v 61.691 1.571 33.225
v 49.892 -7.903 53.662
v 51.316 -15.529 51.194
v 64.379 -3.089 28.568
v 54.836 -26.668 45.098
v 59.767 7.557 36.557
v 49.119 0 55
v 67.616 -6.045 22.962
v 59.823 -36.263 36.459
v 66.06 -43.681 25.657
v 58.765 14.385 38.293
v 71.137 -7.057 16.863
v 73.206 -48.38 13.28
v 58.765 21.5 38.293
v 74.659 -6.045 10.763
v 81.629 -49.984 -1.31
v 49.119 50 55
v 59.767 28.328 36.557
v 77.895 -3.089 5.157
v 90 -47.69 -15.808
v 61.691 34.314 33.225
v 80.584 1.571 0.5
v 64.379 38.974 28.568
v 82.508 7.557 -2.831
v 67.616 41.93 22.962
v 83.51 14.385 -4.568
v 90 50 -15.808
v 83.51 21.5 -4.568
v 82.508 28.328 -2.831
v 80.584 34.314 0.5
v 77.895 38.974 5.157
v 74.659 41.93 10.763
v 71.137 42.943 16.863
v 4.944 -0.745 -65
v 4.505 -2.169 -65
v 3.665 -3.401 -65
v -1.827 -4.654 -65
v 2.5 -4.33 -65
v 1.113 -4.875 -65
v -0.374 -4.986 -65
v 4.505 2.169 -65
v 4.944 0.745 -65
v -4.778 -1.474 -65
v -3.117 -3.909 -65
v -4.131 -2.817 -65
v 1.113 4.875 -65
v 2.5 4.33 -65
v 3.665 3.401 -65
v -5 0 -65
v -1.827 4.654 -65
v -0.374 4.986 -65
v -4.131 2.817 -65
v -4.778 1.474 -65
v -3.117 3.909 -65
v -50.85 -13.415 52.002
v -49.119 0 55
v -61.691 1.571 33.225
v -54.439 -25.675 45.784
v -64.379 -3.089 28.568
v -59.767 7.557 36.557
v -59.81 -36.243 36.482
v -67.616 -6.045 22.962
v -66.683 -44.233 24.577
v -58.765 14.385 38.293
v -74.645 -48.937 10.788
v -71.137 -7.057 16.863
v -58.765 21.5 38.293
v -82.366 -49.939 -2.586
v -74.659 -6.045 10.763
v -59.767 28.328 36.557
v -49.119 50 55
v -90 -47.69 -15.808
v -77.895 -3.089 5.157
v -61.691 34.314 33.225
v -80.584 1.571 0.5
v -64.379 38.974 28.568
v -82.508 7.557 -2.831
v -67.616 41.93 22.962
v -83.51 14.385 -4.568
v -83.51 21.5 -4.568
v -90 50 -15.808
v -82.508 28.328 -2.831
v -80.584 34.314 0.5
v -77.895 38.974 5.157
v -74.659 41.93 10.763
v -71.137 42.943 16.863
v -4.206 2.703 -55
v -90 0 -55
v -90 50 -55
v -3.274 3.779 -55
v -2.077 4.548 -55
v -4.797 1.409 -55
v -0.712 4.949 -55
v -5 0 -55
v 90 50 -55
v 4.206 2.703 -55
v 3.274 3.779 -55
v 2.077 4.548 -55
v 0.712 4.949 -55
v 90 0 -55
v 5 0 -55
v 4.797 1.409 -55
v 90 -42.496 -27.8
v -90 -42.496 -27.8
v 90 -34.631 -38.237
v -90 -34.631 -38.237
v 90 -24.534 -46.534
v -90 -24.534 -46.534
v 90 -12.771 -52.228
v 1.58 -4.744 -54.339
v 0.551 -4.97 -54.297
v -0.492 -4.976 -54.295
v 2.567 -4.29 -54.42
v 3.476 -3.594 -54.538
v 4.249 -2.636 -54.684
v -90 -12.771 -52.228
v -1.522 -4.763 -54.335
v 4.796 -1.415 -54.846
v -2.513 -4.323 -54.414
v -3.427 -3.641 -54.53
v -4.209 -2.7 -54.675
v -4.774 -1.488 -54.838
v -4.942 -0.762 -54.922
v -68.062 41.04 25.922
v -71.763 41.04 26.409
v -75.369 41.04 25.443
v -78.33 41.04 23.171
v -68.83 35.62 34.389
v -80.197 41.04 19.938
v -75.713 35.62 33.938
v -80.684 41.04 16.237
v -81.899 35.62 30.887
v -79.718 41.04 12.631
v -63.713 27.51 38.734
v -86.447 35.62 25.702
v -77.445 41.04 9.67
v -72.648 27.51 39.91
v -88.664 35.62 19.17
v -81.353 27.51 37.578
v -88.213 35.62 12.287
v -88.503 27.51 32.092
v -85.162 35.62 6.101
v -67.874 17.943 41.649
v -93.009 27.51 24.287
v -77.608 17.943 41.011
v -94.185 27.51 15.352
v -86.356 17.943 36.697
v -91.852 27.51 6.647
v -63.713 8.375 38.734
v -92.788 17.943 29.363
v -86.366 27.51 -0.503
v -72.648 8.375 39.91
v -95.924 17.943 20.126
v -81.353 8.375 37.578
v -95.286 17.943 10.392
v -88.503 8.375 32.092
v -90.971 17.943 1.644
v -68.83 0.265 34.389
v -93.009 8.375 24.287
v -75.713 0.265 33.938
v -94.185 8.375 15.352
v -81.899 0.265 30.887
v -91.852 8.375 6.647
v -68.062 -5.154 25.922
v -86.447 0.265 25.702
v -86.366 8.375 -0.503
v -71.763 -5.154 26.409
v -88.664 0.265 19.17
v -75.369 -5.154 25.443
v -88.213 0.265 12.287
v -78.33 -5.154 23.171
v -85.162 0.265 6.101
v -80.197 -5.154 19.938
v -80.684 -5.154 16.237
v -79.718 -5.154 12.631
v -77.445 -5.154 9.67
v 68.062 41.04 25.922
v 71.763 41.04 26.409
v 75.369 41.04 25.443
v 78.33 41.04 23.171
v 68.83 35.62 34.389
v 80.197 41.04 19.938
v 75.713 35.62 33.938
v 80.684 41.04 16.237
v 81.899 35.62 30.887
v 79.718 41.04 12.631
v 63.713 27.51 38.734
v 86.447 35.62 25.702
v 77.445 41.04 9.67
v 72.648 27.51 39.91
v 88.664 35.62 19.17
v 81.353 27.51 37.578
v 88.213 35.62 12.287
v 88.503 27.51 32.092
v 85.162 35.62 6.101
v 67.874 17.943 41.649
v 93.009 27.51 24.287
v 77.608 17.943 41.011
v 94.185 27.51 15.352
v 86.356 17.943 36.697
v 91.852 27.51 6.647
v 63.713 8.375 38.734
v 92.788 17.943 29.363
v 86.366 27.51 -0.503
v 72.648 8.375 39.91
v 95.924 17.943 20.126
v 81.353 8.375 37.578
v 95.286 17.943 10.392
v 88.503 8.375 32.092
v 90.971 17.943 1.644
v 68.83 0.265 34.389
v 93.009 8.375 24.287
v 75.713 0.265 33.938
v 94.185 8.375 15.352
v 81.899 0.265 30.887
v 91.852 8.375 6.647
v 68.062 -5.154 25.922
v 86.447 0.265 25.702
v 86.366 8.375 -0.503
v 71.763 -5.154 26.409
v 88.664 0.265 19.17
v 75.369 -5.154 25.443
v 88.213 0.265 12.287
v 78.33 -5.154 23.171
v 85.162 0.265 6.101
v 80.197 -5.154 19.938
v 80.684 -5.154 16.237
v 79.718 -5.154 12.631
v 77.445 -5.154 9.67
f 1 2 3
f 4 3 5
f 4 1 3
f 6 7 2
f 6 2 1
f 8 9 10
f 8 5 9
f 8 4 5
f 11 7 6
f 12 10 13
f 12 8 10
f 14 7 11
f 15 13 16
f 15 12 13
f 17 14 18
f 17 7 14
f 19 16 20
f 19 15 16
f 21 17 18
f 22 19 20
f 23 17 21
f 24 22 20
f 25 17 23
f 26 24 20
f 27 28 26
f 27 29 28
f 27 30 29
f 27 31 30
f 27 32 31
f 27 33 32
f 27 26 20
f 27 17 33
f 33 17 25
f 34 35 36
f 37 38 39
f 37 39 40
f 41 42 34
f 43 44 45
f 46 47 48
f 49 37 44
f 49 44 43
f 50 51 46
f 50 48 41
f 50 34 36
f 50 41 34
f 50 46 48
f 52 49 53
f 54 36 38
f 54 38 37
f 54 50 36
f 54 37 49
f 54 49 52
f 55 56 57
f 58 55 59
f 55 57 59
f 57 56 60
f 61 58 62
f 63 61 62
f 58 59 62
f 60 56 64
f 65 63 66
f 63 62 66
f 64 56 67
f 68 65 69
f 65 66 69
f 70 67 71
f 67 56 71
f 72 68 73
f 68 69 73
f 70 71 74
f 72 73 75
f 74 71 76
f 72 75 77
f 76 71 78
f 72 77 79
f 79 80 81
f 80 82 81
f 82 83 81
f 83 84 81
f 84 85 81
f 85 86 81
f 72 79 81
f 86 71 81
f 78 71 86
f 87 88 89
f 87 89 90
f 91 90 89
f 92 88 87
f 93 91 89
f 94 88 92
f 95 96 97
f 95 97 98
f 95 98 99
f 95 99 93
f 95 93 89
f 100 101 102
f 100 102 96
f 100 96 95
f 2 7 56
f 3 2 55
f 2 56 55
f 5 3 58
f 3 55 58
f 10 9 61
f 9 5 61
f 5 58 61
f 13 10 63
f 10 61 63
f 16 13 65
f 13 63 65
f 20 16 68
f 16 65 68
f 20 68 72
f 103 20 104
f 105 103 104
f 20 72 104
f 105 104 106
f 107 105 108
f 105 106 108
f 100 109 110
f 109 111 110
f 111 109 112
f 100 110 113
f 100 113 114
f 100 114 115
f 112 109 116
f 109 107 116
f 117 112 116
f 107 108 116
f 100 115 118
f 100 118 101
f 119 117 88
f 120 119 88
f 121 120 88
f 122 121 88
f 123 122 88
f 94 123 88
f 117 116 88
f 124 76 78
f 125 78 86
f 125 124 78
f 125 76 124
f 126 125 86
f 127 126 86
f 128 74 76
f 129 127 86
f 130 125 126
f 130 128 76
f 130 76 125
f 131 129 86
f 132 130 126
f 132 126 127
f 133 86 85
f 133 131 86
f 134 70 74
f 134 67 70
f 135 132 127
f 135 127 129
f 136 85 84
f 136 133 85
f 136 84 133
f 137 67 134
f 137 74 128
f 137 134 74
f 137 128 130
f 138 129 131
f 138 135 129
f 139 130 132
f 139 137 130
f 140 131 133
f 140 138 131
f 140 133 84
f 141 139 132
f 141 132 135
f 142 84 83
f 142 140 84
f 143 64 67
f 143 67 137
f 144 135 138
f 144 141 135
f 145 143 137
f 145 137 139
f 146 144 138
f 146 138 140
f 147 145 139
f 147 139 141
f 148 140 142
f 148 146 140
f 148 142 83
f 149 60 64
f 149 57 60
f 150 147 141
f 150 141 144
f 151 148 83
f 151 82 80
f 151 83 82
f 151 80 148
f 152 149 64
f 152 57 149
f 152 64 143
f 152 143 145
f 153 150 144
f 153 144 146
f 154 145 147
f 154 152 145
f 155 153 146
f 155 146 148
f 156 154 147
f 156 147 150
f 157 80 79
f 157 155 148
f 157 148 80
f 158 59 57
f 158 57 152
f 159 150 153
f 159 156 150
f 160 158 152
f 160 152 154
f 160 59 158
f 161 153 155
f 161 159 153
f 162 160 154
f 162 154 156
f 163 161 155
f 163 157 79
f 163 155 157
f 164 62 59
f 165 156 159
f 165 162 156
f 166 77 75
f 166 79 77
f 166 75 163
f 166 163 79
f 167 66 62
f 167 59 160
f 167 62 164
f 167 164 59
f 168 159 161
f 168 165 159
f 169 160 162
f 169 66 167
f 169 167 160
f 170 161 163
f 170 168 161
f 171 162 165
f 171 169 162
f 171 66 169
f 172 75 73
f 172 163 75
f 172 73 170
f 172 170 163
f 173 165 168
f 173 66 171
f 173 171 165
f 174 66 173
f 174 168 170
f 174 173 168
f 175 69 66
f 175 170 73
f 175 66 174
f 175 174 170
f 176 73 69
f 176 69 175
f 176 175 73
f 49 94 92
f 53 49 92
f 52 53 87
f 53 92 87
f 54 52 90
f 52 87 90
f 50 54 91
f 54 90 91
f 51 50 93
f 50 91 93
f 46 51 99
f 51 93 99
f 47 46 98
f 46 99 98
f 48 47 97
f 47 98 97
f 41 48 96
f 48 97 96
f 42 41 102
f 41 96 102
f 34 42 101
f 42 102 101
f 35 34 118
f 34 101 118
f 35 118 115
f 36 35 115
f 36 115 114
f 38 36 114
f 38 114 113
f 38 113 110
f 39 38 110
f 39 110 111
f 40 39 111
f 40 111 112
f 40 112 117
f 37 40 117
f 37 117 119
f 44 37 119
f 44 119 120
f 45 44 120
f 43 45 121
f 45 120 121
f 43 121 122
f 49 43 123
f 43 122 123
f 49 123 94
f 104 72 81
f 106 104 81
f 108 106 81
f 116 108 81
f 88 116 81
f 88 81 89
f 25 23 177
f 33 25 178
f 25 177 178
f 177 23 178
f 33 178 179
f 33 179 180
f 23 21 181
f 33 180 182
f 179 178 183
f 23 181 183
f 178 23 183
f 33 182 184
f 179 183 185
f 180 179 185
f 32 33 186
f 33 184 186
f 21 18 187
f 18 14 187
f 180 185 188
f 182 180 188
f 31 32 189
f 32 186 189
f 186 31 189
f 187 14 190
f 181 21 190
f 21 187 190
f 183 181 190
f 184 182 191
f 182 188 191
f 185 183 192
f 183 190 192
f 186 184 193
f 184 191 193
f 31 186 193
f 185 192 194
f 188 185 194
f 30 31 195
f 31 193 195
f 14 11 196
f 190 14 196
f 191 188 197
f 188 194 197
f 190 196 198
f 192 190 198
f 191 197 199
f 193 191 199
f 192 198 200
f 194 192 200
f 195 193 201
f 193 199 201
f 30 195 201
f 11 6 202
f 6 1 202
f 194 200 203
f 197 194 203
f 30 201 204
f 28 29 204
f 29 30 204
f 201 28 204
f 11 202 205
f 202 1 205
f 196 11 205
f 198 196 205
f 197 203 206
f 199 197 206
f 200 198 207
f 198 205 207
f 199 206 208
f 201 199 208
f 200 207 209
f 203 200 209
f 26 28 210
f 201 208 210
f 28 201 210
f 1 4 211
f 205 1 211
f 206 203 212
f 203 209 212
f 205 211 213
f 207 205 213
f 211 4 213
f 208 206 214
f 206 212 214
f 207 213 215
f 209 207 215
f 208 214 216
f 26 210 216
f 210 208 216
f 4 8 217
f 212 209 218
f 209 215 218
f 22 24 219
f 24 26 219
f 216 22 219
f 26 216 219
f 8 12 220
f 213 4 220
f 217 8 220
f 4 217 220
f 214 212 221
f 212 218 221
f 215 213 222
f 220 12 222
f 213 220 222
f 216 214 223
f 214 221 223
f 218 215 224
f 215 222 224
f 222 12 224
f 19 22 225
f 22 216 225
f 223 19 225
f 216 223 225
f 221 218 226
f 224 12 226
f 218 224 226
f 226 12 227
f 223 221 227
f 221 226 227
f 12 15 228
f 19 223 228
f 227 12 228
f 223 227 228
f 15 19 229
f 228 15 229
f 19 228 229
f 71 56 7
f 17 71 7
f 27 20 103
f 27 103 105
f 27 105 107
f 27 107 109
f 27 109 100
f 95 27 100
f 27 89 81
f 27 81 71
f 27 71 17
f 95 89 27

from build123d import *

# Parameters (mm, degrees)
SKETCH1_W                = 180
SKETCH1_H                = 110
BOSS_EXTRUDE1_DEPTH      = 50
BOSS_EXTRUDE2_DEPTH      = 180
CUT_EXTRUDE1_DEPTH       = 146.344418537
BOSS_EXTRUDE5_DEPTH      = 10
BOSS_EXTRUDE5_DEPTH_BACK = 10
SKETCH5_R                = 5


with BuildPart() as part:
    # Sketch1 → Boss-Extrude1 (new body)
    with BuildSketch(Plane(origin=(0, 0, 0), x_dir=(1, 0, 0), z_dir=(0, 1, 0))):
        Rectangle(SKETCH1_W, SKETCH1_H)
    extrude(amount=BOSS_EXTRUDE1_DEPTH)

    # Sketch2 → Boss-Extrude2 (add)
    with BuildSketch(Plane.ZY.offset(90)):
        with BuildLine():
            Line((-55, 0), (55, 0))
            ThreePointArc((55, 0), (0, -50), (-55, 0))
        make_face()
    extrude(amount=-BOSS_EXTRUDE2_DEPTH)

    # Sketch3 → Cut-Extrude1 (cut, through all)
    with BuildSketch(Plane(origin=(0, 50, 0), x_dir=(1, 0, 0), z_dir=(0, 1, 0))):
        Polygon((-49.118803686, -55), (-90, 15.808309091), (-90, -55), align=None)
    cut_extrude1 = extrude(amount=-CUT_EXTRUDE1_DEPTH, mode=Mode.SUBTRACT)

    # Mirror1: Cut-Extrude1 across plane
    add(cut_extrude1.mirror(Plane(origin=(0, 0, 0), x_dir=(0, 0, 1), z_dir=(1, 0, 0))), mode=Mode.SUBTRACT)

    # Sketch5 → Boss-Extrude5 (add, two sides: drawn at the far end of the back side and taken through both)
    with BuildSketch(Plane(origin=(0, 0, -55), x_dir=(-1, 0, 0), z_dir=(0, 0, -1)).offset(-BOSS_EXTRUDE5_DEPTH_BACK)):
        Circle(SKETCH5_R)
    extrude(amount=BOSS_EXTRUDE5_DEPTH + BOSS_EXTRUDE5_DEPTH_BACK)

    # Sketch4 → Revolve1 (revolve)
    with BuildSketch(Plane(origin=(-60.654801368, 0, 35.019065898), x_dir=(0.49999999999999495, 0, 0.8660254037844417), z_dir=(-0.8660254037844417, 0, 0.49999999999999495))):
        with BuildLine():
            ThreePointArc((-20.965161058, 42.942576489), (4.034838942, 17.942576489), (-20.965161058, -7.057423511))
            Line((-20.965161058, -7.057423511), (-20.965161058, 42.942576489))
        make_face()
    revolve1 = revolve(axis=Axis((-71.137381897, 42.942576489, 16.862703827), (0, -1, 0)))

    # Mirror2: Revolve1 across plane
    add(revolve1.mirror(Plane(origin=(0, 0, 0), x_dir=(0, 0, 1), z_dir=(1, 0, 0))))


solid = part.part
